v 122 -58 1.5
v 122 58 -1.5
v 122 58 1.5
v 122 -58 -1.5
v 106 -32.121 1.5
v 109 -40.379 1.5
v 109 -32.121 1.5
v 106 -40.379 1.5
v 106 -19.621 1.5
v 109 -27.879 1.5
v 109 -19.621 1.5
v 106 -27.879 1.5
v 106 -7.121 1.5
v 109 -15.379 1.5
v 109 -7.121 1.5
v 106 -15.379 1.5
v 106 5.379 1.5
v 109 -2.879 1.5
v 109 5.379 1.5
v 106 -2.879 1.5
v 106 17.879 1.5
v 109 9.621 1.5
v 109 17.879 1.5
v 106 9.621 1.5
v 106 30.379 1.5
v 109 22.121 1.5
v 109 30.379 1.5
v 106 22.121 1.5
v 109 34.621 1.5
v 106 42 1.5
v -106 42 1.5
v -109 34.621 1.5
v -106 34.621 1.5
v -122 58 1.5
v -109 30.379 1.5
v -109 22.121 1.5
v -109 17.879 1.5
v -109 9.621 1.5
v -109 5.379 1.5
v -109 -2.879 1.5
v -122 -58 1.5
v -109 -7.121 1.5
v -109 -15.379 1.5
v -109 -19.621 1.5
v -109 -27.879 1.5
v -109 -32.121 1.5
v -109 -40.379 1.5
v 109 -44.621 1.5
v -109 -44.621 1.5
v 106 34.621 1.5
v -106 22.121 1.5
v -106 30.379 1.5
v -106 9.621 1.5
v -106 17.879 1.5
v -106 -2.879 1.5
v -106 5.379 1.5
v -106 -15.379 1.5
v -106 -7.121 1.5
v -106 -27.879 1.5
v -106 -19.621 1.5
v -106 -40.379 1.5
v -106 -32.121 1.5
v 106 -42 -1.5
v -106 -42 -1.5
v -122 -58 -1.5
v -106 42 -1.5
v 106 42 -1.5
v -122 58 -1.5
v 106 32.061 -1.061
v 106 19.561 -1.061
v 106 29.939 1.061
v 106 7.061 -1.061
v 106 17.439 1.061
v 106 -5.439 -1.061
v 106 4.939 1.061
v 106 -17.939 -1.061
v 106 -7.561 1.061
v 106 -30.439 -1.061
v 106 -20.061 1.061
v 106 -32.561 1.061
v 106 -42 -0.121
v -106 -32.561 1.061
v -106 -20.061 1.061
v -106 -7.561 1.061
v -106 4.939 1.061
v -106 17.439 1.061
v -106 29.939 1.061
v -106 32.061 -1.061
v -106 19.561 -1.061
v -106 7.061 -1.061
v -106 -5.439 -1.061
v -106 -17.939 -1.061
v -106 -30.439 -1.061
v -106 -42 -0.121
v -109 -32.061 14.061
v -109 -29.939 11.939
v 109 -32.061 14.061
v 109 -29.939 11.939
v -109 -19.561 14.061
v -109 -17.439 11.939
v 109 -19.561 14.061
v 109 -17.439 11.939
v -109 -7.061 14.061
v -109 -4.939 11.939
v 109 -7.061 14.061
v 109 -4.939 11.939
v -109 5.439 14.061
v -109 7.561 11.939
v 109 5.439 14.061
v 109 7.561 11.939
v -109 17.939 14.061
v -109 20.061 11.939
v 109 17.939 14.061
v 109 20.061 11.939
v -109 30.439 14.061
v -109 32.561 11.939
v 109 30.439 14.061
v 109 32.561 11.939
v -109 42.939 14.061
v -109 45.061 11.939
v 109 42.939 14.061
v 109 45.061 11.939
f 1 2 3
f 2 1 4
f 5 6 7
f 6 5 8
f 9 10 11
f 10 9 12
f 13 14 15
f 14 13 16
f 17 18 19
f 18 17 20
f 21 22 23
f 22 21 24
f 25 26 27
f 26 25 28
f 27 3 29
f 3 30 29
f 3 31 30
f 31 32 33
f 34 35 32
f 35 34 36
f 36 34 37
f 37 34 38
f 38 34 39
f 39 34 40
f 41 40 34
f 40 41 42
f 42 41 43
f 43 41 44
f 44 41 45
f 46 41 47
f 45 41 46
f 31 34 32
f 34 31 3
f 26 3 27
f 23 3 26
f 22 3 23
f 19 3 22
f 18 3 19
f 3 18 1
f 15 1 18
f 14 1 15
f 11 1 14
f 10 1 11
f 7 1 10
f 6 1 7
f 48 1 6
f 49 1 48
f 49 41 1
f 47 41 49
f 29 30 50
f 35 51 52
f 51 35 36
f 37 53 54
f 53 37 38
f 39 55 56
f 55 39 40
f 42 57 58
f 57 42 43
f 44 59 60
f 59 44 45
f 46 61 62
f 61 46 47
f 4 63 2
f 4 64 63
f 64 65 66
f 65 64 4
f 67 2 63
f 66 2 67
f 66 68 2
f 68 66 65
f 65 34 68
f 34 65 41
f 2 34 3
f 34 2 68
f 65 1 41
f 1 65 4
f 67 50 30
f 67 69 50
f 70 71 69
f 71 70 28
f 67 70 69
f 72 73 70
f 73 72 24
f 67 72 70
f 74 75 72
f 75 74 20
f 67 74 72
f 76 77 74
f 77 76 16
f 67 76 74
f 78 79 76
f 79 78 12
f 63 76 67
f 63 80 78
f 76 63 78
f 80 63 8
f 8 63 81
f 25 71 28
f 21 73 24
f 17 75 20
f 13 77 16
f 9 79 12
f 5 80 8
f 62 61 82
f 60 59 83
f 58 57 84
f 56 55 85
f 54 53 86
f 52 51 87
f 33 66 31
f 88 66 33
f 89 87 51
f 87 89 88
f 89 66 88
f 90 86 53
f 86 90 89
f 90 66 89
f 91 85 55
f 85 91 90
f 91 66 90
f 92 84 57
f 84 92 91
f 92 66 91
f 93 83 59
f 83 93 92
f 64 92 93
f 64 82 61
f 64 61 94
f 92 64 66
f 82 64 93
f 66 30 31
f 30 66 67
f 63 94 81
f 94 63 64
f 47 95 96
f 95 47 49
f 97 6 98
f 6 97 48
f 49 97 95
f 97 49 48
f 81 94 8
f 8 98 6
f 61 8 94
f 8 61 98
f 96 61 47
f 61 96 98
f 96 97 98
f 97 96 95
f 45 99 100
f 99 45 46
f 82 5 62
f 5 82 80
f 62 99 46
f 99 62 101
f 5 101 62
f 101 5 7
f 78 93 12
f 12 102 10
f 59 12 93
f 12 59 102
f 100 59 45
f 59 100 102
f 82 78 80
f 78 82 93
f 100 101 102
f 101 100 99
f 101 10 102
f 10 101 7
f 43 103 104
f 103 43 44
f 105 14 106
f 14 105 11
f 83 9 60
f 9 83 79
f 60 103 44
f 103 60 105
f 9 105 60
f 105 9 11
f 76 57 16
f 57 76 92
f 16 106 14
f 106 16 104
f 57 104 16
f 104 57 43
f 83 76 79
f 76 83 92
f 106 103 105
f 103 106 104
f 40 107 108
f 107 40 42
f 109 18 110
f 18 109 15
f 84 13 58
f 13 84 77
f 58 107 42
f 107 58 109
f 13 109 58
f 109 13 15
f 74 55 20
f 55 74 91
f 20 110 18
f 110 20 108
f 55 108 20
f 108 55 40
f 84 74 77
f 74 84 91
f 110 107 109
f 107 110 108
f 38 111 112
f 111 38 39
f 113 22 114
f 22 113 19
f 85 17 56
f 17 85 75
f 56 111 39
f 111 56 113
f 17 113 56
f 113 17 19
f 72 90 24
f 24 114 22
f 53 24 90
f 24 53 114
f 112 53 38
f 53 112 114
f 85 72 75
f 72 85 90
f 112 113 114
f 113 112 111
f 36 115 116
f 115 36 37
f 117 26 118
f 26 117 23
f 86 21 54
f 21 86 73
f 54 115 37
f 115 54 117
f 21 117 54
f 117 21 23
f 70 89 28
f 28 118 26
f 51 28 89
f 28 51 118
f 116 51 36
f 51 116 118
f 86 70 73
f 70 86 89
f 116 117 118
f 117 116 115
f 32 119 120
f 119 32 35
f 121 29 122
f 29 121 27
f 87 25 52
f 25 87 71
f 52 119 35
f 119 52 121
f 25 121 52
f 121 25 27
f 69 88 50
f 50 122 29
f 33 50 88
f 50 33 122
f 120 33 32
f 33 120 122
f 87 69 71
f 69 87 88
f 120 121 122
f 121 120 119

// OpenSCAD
hole_width = 228;
hole_height = 100;
hole_depth = 13;

ext_flange_size = 8;
thickness = 3;
fin_height = sqrt(2 * hole_depth * hole_depth);

external_width = hole_width + 2 * ext_flange_size;
external_height = hole_height + 2 * ext_flange_size;

internal_width = hole_width - 2 * ext_flange_size;
internal_height = hole_height - 2 * ext_flange_size;

module base_plate() {
    difference() {
        cube([external_width, external_height, thickness], center = true);
        cube([internal_width, internal_height, thickness+1], center = true);
    }
}

module fin() {
    offset = sqrt((fin_height * fin_height)/2)/2;
    translate([0, 0, offset]) {
        rotate([45, 0, 0]) {
            cube([internal_width+2*thickness, fin_height, thickness], center = true);
        }
    }
}

module fins() {
    num_fins = 7;
    fin_spacing = hole_height / (num_fins + 1);
    
    for(y = [fin_spacing : fin_spacing : hole_height - fin_spacing]) {
        translate([0, y - hole_height/2, 0]) fin();
    }
}

base_plate();
fins();
